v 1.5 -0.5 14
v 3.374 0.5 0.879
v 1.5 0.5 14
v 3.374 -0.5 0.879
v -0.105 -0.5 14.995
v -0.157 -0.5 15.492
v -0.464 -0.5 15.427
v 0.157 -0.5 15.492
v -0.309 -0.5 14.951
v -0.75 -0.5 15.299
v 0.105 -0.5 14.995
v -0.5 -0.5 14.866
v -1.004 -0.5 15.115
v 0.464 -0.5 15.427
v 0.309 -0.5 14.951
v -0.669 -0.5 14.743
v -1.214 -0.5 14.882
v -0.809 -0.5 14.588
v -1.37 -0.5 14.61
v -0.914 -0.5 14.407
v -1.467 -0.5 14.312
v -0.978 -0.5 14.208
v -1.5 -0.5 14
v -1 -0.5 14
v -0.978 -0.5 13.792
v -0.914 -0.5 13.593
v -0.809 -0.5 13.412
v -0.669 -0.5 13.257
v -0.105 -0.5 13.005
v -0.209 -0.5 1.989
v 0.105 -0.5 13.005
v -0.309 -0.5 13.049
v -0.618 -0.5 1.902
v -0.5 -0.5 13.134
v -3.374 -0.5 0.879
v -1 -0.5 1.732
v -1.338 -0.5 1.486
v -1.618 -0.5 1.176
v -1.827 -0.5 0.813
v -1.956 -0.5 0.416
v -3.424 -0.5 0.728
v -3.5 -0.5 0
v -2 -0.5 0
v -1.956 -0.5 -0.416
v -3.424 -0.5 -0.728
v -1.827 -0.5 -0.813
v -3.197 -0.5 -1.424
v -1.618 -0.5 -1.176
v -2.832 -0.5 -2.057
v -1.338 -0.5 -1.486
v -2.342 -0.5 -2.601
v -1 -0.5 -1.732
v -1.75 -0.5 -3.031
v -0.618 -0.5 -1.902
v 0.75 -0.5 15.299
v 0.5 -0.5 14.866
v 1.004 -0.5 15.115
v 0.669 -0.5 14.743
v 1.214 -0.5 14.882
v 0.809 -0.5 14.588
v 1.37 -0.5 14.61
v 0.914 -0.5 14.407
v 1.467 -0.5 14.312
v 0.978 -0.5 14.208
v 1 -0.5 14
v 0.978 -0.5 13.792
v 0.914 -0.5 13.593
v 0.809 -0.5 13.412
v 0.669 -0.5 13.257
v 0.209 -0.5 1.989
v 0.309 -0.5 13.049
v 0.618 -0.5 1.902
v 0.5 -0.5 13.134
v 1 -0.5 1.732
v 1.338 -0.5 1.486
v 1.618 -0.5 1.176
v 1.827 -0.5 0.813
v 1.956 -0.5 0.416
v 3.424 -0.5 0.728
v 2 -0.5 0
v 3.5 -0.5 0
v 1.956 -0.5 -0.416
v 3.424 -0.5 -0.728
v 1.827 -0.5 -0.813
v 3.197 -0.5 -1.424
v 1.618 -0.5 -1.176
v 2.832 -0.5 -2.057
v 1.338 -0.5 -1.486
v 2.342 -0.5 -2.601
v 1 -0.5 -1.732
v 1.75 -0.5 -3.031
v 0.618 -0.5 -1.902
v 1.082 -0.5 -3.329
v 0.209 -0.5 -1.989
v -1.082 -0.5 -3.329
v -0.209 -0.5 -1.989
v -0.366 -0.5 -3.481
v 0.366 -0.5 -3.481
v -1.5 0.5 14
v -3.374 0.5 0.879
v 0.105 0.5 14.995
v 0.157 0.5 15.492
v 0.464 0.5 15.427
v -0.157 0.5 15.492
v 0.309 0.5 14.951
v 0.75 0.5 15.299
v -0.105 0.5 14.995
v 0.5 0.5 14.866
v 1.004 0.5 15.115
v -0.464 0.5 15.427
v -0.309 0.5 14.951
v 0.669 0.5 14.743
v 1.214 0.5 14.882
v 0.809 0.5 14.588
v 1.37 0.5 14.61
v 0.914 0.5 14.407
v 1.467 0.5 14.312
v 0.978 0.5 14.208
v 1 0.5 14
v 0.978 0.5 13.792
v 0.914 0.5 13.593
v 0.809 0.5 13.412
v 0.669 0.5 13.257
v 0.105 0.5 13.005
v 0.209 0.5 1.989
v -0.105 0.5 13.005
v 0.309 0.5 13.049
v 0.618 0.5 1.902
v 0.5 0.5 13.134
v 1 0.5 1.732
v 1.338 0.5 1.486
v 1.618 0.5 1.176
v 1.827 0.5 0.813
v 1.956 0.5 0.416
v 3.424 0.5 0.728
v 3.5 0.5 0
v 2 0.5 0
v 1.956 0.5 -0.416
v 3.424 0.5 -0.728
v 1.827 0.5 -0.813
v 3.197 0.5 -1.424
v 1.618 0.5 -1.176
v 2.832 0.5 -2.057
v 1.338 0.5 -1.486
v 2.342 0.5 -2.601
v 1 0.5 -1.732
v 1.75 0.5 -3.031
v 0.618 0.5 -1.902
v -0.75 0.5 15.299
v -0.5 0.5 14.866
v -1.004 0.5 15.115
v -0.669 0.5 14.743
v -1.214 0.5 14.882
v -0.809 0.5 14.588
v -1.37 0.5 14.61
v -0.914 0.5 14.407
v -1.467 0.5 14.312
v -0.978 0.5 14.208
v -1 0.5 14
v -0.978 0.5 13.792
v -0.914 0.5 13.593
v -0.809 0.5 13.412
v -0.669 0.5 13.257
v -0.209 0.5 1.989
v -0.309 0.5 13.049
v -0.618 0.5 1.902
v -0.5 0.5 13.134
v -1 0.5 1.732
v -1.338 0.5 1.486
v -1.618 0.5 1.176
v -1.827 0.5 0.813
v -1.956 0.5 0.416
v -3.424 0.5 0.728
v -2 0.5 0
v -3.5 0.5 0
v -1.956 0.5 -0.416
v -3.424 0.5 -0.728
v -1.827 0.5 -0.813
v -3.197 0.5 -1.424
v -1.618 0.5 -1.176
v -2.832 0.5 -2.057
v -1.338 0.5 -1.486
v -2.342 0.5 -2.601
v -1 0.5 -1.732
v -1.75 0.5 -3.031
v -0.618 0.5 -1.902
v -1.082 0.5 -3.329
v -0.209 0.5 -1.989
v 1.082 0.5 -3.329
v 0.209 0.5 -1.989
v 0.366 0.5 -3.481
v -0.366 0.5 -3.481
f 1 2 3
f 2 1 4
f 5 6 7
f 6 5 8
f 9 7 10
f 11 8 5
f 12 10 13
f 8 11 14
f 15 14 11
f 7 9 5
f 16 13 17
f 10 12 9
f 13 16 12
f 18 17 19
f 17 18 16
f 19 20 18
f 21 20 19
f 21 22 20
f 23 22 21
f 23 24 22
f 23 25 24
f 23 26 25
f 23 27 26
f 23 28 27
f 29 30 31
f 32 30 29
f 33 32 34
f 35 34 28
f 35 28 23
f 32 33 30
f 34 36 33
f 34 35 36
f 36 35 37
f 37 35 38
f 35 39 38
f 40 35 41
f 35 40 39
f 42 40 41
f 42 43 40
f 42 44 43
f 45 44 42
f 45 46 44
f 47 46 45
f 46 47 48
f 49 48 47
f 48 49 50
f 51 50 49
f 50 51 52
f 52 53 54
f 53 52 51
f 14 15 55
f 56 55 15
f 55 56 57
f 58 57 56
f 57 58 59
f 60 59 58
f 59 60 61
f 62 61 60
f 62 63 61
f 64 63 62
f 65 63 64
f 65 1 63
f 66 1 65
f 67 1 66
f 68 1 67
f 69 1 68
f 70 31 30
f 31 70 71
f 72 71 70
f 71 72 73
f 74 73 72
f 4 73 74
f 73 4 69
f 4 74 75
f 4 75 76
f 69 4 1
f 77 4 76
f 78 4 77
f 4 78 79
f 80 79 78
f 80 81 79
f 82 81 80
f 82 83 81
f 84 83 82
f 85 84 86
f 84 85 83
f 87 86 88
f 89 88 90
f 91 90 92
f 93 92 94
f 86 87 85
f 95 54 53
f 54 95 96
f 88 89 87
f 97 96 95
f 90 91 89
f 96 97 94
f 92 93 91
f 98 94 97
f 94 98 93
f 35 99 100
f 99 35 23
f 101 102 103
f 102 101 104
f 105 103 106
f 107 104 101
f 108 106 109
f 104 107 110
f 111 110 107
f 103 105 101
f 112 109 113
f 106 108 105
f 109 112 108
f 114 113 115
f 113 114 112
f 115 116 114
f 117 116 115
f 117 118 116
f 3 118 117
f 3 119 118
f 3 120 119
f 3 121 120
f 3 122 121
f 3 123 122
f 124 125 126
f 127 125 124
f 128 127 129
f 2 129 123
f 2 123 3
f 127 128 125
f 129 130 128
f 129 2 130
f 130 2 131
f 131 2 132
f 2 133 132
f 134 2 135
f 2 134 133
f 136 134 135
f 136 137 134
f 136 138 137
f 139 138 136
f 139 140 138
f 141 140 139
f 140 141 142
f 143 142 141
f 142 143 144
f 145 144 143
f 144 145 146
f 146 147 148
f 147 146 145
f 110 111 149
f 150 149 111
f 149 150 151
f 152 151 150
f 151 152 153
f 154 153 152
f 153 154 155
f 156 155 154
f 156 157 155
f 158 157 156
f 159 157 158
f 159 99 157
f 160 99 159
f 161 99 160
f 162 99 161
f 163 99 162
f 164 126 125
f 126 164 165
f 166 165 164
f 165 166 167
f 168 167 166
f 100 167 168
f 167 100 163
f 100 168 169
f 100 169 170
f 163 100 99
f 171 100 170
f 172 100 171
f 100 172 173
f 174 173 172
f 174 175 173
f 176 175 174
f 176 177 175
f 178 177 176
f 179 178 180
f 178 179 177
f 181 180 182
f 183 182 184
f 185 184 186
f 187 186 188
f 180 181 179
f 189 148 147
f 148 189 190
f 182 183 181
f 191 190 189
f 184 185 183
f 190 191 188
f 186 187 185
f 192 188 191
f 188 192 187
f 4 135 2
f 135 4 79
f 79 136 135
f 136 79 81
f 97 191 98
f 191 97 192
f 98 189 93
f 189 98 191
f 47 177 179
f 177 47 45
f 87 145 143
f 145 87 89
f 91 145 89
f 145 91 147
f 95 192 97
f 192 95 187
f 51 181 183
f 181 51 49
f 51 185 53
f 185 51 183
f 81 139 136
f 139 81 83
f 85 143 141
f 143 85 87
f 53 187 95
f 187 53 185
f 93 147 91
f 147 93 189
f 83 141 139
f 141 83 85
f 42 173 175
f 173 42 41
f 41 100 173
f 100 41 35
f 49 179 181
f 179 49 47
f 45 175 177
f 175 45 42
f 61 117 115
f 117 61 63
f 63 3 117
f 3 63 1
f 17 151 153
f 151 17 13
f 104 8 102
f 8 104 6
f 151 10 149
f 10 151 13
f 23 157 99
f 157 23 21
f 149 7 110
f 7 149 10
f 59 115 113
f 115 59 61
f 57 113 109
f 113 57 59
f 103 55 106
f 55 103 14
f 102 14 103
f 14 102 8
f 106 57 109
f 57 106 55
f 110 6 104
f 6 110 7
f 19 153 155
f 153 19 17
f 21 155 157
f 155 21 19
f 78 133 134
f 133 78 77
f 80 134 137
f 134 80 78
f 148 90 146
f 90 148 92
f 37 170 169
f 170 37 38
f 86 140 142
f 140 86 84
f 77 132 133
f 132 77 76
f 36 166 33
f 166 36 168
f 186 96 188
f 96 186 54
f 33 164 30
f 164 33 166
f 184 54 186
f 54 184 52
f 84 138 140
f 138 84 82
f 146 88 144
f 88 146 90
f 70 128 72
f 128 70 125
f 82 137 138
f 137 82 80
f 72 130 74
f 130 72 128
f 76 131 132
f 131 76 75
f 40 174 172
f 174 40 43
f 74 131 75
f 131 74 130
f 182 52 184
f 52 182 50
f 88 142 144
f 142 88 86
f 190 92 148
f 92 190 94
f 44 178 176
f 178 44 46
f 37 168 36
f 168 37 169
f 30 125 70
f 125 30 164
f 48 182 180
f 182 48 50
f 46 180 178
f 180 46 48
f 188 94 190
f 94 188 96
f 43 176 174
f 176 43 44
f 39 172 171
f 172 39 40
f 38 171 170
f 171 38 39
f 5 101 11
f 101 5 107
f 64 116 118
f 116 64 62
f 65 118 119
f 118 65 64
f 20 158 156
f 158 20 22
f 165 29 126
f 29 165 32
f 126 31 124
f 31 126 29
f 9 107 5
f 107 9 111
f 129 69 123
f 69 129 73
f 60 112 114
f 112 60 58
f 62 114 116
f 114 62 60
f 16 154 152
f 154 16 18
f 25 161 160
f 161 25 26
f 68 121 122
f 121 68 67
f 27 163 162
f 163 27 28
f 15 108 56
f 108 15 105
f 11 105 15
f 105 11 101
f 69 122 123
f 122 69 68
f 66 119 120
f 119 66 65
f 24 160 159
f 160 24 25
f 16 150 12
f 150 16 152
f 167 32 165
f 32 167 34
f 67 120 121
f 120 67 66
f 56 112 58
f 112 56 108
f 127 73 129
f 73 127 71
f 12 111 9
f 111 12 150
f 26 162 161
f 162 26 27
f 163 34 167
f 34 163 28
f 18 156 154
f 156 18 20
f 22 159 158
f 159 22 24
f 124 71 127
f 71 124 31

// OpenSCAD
module Rod_01(){

    rotate([0,$t*360,0])  {
    translate([-3.5,0,4])
    difference(){
        union(){
            color("gray")
            translate([0,0,0])
            rotate([90,0,0])
            linear_extrude(1, scale = 1, center = true)
            polygon(points=[[0,-4],[7,-4],[5,10],[2,10]]);

            color("gray")
               rotate([90,0,0])  
               translate([3.5,-4,0])
               cylinder(1,3.5,3.5, $fn = 30, center = true);  
               
            color("gray")
               rotate([90,0,0])  
               translate([3.5,10,0])
               cylinder(1,1.5,1.5, $fn = 30, center = true);  
        }

        color("gray")
        rotate([90,0,0])  
        translate([3.5,-4,0])
        cylinder(2,2,2, $fn = 30, center = true);  
           
         color("gray")
         rotate([90,0,0])  
         translate([3.5,10,0])
         cylinder(2,1,1, $fn = 30, center = true);  

        }
    }
}

Rod_01();

// Written by Nicolì Angelo (Gengio) 2024: 
// MIT License

//Permission is hereby granted, free of charge, to any person obtaining a copy of this software and associated documentation files (the "Software"), to deal in the Software without restriction, including without limitation the rights to use, copy, modify, merge, publish, distribute, sublicense, and/or sell copies of the Software, and to permit persons to whom the Software is furnished to do so, subject to the following conditions:

//The above copyright notice and this permission notice shall be included in all copies or substantial portions of the Software.

//THE SOFTWARE IS PROVIDED "AS IS", WITHOUT WARRANTY OF ANY KIND, EXPRESS OR IMPLIED, INCLUDING BUT NOT LIMITED TO THE WARRANTIES OF MERCHANTABILITY, FITNESS FOR A PARTICULAR PURPOSE AND NONINFRINGEMENT. IN NO EVENT SHALL THE AUTHORS OR COPYRIGHT HOLDERS BE LIABLE FOR ANY CLAIM, DAMAGES OR OTHER LIABILITY, WHETHER IN AN ACTION OF CONTRACT, TORT OR OTHERWISE, ARISING FROM, OUT OF OR IN CONNECTION WITH THE SOFTWARE OR THE USE OR OTHER DEALINGS IN THE SOFTWARE.
